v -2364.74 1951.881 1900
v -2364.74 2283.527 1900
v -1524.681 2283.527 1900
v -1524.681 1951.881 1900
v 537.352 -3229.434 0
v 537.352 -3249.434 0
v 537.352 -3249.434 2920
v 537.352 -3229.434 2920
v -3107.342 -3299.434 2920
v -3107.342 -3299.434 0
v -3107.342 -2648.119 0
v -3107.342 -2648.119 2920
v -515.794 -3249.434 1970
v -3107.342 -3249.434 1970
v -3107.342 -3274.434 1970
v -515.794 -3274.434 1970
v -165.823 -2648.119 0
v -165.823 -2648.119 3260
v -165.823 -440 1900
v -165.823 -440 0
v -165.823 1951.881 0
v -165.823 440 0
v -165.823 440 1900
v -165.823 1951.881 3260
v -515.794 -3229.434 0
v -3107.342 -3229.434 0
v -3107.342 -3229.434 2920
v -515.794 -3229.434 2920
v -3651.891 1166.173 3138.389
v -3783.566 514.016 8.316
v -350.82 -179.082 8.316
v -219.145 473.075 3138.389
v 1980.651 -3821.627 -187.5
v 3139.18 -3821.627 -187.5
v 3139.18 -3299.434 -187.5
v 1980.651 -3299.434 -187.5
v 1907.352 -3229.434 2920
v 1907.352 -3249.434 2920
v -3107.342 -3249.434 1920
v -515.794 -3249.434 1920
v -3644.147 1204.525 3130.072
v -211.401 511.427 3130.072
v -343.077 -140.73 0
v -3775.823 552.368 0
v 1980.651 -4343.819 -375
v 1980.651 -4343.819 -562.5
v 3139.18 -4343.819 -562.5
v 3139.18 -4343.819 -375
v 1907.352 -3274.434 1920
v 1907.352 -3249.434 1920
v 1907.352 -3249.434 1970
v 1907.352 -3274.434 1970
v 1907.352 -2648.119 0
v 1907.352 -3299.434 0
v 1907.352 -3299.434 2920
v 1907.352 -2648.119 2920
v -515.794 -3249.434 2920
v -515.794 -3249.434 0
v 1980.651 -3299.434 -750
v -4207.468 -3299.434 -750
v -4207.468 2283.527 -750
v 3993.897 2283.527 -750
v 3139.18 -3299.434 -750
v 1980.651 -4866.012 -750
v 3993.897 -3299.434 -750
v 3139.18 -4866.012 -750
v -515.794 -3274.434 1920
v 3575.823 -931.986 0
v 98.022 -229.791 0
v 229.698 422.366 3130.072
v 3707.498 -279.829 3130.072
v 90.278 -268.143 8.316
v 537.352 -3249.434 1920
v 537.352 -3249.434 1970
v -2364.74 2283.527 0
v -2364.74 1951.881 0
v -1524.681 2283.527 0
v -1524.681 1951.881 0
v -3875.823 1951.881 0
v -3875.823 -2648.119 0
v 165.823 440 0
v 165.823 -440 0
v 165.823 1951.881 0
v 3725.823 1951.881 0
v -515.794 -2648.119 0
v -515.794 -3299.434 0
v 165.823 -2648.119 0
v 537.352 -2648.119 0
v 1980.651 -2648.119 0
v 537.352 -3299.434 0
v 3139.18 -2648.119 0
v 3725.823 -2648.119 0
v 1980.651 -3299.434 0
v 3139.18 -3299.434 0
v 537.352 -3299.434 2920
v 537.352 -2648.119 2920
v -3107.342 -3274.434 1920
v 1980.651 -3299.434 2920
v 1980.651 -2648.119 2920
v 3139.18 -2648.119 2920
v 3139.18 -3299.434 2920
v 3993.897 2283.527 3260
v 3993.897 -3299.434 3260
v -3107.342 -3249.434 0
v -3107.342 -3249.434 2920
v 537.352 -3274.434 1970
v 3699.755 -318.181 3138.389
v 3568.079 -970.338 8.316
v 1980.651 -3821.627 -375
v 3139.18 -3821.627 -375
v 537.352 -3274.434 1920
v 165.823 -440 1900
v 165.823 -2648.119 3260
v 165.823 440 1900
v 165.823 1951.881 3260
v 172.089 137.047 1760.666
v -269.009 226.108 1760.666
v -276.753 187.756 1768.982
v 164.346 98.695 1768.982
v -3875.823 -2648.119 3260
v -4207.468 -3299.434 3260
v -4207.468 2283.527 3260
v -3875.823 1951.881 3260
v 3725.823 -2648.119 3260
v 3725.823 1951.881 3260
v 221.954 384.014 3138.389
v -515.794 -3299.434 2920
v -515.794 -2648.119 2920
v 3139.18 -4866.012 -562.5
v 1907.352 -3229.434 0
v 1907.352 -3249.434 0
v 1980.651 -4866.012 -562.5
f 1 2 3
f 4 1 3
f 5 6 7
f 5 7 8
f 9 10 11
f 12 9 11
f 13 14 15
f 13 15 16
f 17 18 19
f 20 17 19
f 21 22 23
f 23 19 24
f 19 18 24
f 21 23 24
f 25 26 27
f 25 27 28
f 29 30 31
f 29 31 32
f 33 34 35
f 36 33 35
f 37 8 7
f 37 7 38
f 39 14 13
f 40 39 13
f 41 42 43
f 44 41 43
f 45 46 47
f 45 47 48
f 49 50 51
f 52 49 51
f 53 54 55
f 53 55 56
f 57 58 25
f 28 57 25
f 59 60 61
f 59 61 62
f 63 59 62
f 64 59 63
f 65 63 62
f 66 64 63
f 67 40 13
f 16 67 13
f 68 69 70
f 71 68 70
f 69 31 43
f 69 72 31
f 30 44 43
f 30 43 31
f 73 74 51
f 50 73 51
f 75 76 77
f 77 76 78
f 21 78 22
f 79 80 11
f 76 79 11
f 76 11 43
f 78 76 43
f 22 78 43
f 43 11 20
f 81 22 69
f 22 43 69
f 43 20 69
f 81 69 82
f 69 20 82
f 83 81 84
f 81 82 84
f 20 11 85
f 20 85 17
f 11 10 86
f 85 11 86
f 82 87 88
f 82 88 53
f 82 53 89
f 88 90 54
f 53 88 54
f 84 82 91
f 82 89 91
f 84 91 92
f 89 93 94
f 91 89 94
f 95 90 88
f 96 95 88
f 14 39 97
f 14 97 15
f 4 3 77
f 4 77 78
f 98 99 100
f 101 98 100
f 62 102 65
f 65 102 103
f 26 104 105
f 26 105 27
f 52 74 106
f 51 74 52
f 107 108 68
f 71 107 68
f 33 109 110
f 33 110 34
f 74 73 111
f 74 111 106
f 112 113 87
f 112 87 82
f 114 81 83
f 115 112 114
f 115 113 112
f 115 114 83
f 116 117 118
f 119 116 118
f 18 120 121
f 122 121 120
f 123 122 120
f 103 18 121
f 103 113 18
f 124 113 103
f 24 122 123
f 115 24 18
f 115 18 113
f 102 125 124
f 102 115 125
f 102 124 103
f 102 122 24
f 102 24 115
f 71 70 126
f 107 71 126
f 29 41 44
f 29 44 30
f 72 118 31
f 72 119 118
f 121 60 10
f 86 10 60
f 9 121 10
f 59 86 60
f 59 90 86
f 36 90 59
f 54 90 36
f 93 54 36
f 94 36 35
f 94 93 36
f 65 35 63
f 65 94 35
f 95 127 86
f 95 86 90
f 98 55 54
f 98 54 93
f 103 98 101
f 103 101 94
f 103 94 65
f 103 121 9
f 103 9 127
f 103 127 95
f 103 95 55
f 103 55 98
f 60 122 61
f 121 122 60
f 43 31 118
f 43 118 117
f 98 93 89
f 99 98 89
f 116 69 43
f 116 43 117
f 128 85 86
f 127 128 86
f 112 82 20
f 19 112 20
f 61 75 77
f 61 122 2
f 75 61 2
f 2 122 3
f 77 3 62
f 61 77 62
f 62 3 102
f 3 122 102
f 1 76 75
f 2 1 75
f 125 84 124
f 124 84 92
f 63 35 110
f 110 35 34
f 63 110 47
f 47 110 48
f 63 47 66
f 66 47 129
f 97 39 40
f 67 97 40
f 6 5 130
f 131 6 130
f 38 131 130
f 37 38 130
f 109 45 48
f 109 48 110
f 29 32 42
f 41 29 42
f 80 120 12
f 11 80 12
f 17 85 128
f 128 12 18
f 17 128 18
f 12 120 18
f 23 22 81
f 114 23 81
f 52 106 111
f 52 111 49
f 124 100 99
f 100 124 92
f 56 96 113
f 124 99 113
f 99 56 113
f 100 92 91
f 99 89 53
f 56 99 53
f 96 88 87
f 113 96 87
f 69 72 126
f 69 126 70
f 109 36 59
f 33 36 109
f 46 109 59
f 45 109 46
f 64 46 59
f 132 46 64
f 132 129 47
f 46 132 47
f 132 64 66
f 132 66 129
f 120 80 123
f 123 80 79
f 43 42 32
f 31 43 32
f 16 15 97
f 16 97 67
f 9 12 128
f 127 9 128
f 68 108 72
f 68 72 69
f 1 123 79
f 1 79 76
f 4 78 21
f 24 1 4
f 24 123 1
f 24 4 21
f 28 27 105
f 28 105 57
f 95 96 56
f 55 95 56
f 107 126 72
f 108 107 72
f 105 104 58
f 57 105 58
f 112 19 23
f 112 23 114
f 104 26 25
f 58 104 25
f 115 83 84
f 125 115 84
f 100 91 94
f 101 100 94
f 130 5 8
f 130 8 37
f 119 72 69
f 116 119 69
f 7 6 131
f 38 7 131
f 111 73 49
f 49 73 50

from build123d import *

# Parameters (mm, degrees)
F1_DEPTH  = 3260
F0_W      = 73.2982206345
F0_H      = 651.3152122498
F2_W      = 8201.365070343
F2_H      = 5582.9607772827
F3_DEPTH  = 750
F5_DEPTH  = 1158.5292816162
F6_W      = 331.645565033
F6_H      = 880
F7_DEPTH  = 1360
F8_W      = 2591.5477871895
F8_H      = 651.3152122498
F8_W_2    = 1370
F8_W_3    = 1158.5292816162
F9_DEPTH  = 340
F10_W     = 840.0592803955
F10_H     = 331.645565033
F11_DEPTH = 1360
F12_W     = 2591.5477871895
F12_H     = 20
F13_DEPTH = 2920
F12_W_2   = 1370
F14_W     = 2591.5477871895
F14_H     = 50
F15_DEPTH = 25
F14_W_2   = 1370
F21_DEPTH = 100
F22_DEPTH = 350
F24_DEPTH = 3547.9820241107
F26_DEPTH = 3502.0179758893


with BuildPart() as f1:
    # F0 (on Top) → F1 (new body)
    with BuildSketch(Plane.XY):
        Polygon((-165.8227825165, 1951.8810272217), (-165.8227825165, 440), (165.8227825165, 440), (165.8227825165, 1951.8810272217), (3725.8227825165, 1951.8810272217), (3725.8227825165, -2648.1189727783), (3139.1799449921, -2648.1189727783), (3139.1799449921, -3299.4341850281), (3993.8967227936, -3299.4341850281), (3993.8967227936, 2283.5265922546), (-1524.6810913086, 2283.5265922546), (-1524.6810913086, 1951.8810272217), align=None)
    extrude(amount=F1_DEPTH)



with BuildPart() as f1b:
    # F0 (on Top) → F1, piece 2 (new body)
    with BuildSketch(Plane.XY):
        Polygon((165.8227825165, -440), (-165.8227825165, -440), (-165.8227825165, -2648.1189727783), (-515.7937407494, -2648.1189727783), (-515.7937407494, -3299.4341850281), (537.3524427414, -3299.4341850281), (537.3524427414, -2648.1189727783), (165.8227825165, -2648.1189727783), align=None)
    extrude(amount=F1_DEPTH)


with BuildPart() as f1c:
    # F0 (on Top) → F1, piece 3 (new body)
    with BuildSketch(Plane.XY):
        Polygon((-3875.8227825165, -2648.1189727783), (-3875.8227825165, 1951.8810272217), (-2364.7403717041, 1951.8810272217), (-2364.7403717041, 2283.5265922546), (-4207.4683475494, 2283.5265922546), (-4207.4683475494, -3299.4341850281), (-3107.3415279388, -3299.4341850281), (-3107.3415279388, -2648.1189727783), align=None)
    extrude(amount=F1_DEPTH)


with BuildPart() as f1d:
    # F0 (on Top) → F1, piece 4 (new body)
    with BuildSketch(Plane.XY):
        with Locations((1944.0015530586, -2973.7765789032)):
            Rectangle(F0_W, F0_H)
    extrude(amount=F1_DEPTH)


with BuildPart() as f1_1:
    add(f1.part)

    add(f1b.part)  # F3 merges F1b

    add(f1c.part)  # F3 merges F1c

    add(f1d.part)  # F3 merges F1d
    # F2 (on face) → F3 (join)
    with BuildSketch(Plane(origin=(0, 0, 0), x_dir=(1, 0, 0), z_dir=(0, 0, -1))):
        with Locations((-106.7858123779, 507.9537963867)):
            Rectangle(F2_W, F2_H)
    extrude(amount=F3_DEPTH)

    # F4 (on face) → F5 (join, through all)
    with BuildSketch(Plane(origin=(3139.1799449921, 0, 0), x_dir=(0, -1, 0), z_dir=(-1, 0, 0))):
        Polygon((3821.626663208, -187.5), (3299.4341850281, -187.5), (3299.4341850281, -750), (4866.0116195679, -750), (4866.0116195679, -562.5), (4343.8191413879, -562.5), (4343.8191413879, -375), (3821.626663208, -375), align=None)
    extrude(amount=F5_DEPTH)

    # F6 (on face) → F7 (join, through all)
    with BuildSketch(Plane.XY.offset(3260)):
        Rectangle(F6_W, F6_H)
    extrude(amount=-F7_DEPTH)

    # F8 (on face) → F9 (join, through all)
    with BuildSketch(Plane.XY.offset(3260)):
        with Locations((-1811.5676343441, -2973.7765789032)):
            Rectangle(F8_W, F8_H)
        with Locations((1222.3524427414, -2973.7765789032)):
            Rectangle(F8_W_2, F8_H)
        with Locations((2559.915304184, -2973.7765789032)):
            Rectangle(F8_W_3, F8_H)
    extrude(amount=-F9_DEPTH)

    # F10 (on face) → F11 (join, through all)
    with BuildSketch(Plane.XY.offset(3260)):
        with Locations((-1944.7107315063, 2117.7038097382)):
            Rectangle(F10_W, F10_H)
    extrude(amount=-F11_DEPTH)



with BuildPart() as f13:
    # F12 (on face) → F13 (new body, through all)
    with BuildSketch(Plane.XY):
        with Locations((-1811.5676343441, -3239.4341850281)):
            Rectangle(F12_W, F12_H)
    extrude(amount=F13_DEPTH)


with BuildPart() as f13b:
    # F12 (on face) → F13, piece 2 (new body, through all)
    with BuildSketch(Plane.XY):
        with Locations((1222.3524427414, -3239.4341850281)):
            Rectangle(F12_W_2, F12_H)
    extrude(amount=F13_DEPTH)


with BuildPart() as f15:
    # F14 (on face) → F15 (new body)
    with BuildSketch(Plane.XZ.offset(3249.4341850281)):
        with Locations((-1811.5676343441, 1945)):
            Rectangle(F14_W, F14_H)
    extrude(amount=F15_DEPTH)


with BuildPart() as f15b:
    # F14 (on face) → F15, piece 2 (new body)
    with BuildSketch(Plane.XZ.offset(3249.4341850281)):
        with Locations((1222.3524427414, 1945)):
            Rectangle(F14_W_2, F14_H)
    extrude(amount=F15_DEPTH)


with BuildPart() as f21:
    # F20 (on line) → F21 (new body)
    with BuildSketch(Plane(origin=(40.7397991721, -8.2256812816, 0), x_dir=(0.1979138976, 0.9802194087, 0), z_dir=(0.9802194087, -0.1979138976, 0))):
        Polygon((-244.9719798503, 8.3164676327), (-205.8460758209, 0), (168.394967651, 1760.6656813209), (129.2690636217, 1768.9821489536), align=None)
    extrude(amount=F21_DEPTH)


with BuildPart() as f1_2:
    add(f1_1.part)

    add(f21.part)  # F22 merges F21
    # F20 (on line) → F22 (join)
    with BuildSketch(Plane(origin=(40.7397991721, -8.2256812816, 0), x_dir=(0.1979138976, 0.9802194087, 0), z_dir=(0.9802194087, -0.1979138976, 0))):
        Polygon((-244.9719798503, 8.3164676327), (-205.8460758209, 0), (168.394967651, 1760.6656813209), (129.2690636217, 1768.9821489536), align=None)
    extrude(amount=-F22_DEPTH)


with BuildPart() as f24:
    # F23 (on face) → F24 (new body, through all)
    with BuildSketch(Plane(origin=(138.7617400392, -28.0170710419, 0), x_dir=(0.1979138976, 0.9802194087, 0), z_dir=(0.9802194087, -0.1979138976, 0))):
        Polygon((420.3454307666, 3138.3887899809), (129.2690636217, 1768.9821489536), (-244.9719798503, 8.3164676327), (-205.8460758209, 0), (168.394967651, 1760.6656813209), (459.4713347959, 3130.0723223482), align=None)
    extrude(amount=F24_DEPTH)


with BuildPart() as f26:
    # F25 (on face) → F26 (new body, through all)
    with BuildSketch(Plane(origin=(-302.3369938628, 61.0441828796, 0), x_dir=(-0.1979138976, -0.9802194087, 0), z_dir=(-0.9802194087, 0.1979138976, 0))):
        Polygon((244.9719798503, 8.3164676327), (-129.2690636217, 1768.9821489536), (-420.3454307666, 3138.3887899809), (-459.4713347959, 3130.0723223482), (-168.394967651, 1760.6656813209), (205.8460758209, 0), align=None)
    extrude(amount=F26_DEPTH)


solid = Compound([f13.part, f13b.part, f15.part, f15b.part, f1_2.part, f24.part, f26.part])
